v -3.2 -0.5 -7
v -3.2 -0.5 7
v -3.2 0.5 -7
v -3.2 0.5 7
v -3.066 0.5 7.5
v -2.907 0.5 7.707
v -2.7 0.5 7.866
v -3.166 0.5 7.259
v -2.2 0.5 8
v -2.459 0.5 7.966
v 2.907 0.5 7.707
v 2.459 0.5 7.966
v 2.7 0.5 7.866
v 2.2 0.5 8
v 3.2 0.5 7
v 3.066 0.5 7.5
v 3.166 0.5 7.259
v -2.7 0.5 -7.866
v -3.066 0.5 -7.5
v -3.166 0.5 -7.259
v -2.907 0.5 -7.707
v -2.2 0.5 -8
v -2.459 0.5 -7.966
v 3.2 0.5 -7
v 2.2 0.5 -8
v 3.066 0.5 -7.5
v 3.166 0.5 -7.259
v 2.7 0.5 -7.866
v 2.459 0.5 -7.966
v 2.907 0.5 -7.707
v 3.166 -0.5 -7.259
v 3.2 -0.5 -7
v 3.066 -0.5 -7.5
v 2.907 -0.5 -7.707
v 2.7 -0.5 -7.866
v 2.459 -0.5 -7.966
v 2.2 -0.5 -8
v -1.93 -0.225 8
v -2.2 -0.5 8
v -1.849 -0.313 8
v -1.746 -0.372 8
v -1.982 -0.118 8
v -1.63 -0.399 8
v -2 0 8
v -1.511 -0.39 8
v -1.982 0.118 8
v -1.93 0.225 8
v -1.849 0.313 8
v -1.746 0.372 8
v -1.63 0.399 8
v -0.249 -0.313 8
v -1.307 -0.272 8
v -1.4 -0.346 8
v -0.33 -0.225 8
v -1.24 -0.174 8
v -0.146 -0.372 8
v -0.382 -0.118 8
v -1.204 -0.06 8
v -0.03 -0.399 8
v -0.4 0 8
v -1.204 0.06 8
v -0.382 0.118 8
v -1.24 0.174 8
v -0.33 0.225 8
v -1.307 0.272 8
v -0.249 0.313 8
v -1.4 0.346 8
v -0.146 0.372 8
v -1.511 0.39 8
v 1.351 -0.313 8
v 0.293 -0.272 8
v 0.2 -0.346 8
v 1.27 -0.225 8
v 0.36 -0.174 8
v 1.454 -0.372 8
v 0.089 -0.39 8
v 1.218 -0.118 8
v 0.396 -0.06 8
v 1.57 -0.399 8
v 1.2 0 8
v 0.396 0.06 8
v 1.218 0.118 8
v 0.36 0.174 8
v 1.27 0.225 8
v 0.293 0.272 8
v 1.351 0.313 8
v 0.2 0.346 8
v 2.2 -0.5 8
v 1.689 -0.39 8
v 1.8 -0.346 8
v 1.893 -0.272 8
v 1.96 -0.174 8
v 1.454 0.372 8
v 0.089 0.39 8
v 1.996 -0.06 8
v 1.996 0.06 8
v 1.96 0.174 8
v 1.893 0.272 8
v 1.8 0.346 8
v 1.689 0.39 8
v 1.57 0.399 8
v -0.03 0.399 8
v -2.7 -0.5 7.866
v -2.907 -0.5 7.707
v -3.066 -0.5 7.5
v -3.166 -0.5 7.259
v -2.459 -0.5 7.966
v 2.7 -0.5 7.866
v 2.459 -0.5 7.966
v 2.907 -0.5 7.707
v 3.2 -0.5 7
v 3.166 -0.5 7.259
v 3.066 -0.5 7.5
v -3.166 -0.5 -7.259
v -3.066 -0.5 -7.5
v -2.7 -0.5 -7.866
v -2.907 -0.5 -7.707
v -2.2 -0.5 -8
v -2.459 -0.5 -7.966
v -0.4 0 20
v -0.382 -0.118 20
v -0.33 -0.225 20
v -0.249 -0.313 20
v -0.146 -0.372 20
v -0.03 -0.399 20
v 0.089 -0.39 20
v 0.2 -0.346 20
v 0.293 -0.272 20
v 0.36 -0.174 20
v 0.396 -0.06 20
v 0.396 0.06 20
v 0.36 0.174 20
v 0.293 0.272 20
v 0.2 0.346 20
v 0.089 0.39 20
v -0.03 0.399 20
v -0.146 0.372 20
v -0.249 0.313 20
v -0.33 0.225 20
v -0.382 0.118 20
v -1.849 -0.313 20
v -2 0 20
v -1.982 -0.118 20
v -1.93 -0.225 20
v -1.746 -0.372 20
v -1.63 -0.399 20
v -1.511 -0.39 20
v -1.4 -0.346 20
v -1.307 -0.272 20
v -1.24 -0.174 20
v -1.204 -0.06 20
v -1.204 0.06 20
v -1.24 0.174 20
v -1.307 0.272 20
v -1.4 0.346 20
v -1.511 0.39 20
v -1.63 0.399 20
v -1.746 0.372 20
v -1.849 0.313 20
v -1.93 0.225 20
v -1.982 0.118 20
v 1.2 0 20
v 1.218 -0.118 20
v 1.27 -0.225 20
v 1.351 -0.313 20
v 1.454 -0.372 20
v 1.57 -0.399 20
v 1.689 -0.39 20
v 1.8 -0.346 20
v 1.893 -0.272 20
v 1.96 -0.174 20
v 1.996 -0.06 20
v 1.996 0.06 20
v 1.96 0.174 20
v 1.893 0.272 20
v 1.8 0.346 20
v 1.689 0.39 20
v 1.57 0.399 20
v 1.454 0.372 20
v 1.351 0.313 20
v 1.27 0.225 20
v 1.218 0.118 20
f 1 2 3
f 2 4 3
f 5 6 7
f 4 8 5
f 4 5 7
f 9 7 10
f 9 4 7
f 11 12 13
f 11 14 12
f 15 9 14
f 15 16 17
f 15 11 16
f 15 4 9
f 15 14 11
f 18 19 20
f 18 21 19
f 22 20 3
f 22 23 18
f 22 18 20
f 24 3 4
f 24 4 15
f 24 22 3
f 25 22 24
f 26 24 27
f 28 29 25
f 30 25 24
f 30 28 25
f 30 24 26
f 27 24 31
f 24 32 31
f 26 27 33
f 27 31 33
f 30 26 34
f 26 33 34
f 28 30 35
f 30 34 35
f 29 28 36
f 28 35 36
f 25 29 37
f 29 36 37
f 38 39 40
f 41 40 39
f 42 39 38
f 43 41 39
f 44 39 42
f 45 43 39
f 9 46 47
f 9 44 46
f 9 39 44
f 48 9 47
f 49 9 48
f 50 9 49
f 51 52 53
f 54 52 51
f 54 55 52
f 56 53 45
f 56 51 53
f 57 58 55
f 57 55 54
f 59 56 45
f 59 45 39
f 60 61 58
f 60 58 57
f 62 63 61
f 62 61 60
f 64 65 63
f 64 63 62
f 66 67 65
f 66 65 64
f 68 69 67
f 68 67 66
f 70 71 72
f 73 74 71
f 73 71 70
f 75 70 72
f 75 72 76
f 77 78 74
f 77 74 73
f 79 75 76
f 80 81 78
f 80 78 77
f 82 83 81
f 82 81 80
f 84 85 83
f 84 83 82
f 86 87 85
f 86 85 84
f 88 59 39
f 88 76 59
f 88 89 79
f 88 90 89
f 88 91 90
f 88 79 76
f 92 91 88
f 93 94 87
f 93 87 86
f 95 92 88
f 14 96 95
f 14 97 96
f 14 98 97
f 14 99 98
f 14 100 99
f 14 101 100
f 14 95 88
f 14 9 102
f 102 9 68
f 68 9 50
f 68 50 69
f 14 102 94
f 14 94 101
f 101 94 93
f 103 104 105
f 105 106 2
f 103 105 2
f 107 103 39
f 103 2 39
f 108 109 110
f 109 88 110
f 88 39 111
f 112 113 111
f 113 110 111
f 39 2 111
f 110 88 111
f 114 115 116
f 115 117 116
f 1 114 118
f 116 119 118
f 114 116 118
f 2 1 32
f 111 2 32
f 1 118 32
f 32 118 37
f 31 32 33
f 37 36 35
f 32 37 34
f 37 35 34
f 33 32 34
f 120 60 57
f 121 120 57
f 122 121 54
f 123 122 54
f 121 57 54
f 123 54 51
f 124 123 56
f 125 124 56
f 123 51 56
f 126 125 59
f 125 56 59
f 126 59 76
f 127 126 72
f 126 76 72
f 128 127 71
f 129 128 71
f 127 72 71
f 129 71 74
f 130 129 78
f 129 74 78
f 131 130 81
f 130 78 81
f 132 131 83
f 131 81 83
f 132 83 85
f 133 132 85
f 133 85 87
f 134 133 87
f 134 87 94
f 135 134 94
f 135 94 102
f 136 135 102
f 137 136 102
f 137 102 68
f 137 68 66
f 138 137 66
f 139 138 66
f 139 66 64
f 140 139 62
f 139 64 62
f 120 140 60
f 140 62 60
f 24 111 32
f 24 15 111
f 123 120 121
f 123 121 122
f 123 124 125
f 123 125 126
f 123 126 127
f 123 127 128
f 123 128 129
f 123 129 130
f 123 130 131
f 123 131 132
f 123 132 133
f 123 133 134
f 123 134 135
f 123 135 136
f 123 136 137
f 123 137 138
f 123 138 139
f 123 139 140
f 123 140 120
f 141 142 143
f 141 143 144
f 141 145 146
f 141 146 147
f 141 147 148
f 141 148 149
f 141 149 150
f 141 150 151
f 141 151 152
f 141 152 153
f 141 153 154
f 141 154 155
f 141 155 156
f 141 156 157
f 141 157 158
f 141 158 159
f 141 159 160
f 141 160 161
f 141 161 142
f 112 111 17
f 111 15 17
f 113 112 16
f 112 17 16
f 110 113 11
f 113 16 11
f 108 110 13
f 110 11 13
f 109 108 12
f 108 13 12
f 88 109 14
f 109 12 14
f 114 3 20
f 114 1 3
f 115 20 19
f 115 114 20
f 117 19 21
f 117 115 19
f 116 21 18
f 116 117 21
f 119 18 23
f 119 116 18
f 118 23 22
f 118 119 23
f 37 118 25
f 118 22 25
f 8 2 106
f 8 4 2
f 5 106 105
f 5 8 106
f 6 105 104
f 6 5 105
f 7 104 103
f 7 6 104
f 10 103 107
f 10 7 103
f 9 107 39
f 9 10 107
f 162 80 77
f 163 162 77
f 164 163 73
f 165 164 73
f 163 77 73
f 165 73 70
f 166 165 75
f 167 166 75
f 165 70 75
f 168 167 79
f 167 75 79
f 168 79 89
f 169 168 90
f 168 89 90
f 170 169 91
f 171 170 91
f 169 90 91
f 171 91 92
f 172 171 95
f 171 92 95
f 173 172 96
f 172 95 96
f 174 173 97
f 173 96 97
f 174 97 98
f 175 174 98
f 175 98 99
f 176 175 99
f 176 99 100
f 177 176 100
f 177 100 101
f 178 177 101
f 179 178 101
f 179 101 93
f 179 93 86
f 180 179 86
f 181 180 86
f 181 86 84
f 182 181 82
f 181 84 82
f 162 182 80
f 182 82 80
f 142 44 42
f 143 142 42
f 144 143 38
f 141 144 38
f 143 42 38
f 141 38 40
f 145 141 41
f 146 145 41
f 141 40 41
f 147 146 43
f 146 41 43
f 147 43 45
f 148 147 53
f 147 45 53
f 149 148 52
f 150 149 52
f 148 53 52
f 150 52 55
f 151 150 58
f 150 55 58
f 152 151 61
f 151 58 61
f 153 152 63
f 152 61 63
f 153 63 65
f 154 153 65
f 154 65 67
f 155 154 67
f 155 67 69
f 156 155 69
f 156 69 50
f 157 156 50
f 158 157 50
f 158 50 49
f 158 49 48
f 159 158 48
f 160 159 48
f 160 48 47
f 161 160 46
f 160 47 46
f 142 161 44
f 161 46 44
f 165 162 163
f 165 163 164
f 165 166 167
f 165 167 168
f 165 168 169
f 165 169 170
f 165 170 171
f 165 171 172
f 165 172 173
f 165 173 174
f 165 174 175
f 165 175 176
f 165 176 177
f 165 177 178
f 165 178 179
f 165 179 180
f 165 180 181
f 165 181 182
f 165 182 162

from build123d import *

# Parameters (mm, degrees)
SKETCH1_W         = 6.4
SKETCH1_H         = 16
BASE_DEPTH        = 0.5
BF_R              = 1
SKETCH2_R         = 0.4
WIRE_2_DEPTH      = 12
WIRE_LP_COUNT     = 2
WIRE_LP_PITCH     = 1.6
WIRE_LP_COL_COUNT = 2
WIRE_LP_COL_PITCH = 1.6


with BuildPart() as part:
    # Sketch1 → BASE (new, symmetric)
    with BuildSketch(Plane(origin=(0, 0, 0), x_dir=(1, 0, 0), z_dir=(0, 1, 0))):
        Rectangle(SKETCH1_W, SKETCH1_H)
    extrude(amount=BASE_DEPTH, both=True)

    # BF
    bf_edges = [part.edges().sort_by_distance(p)[0] for p in [
        (3.2, 0, 8),
        (-3.2, 0, 8),
        (-3.2, 0, -8),
        (3.2, 0, -8),
    ]]
    fillet(bf_edges, radius=BF_R)

    # Sketch2 → WIRE 2 (add)
    with BuildSketch(Plane.XY.offset(8)):
        with Locations(Location((0, 0, 0), (0, 0, 180))):
            Circle(SKETCH2_R)
    wire_2 = extrude(amount=WIRE_2_DEPTH)

    # WIRE LP: WIRE 2 ×2
    with Locations(*[(-i * WIRE_LP_PITCH, 0, 0) for i in range(1, WIRE_LP_COUNT)]):
        add(wire_2)

    # WIRE LP col: WIRE 2 ×2
    with Locations(*[(i * WIRE_LP_COL_PITCH, 0, 0) for i in range(1, WIRE_LP_COL_COUNT)]):
        add(wire_2)


solid = part.part
